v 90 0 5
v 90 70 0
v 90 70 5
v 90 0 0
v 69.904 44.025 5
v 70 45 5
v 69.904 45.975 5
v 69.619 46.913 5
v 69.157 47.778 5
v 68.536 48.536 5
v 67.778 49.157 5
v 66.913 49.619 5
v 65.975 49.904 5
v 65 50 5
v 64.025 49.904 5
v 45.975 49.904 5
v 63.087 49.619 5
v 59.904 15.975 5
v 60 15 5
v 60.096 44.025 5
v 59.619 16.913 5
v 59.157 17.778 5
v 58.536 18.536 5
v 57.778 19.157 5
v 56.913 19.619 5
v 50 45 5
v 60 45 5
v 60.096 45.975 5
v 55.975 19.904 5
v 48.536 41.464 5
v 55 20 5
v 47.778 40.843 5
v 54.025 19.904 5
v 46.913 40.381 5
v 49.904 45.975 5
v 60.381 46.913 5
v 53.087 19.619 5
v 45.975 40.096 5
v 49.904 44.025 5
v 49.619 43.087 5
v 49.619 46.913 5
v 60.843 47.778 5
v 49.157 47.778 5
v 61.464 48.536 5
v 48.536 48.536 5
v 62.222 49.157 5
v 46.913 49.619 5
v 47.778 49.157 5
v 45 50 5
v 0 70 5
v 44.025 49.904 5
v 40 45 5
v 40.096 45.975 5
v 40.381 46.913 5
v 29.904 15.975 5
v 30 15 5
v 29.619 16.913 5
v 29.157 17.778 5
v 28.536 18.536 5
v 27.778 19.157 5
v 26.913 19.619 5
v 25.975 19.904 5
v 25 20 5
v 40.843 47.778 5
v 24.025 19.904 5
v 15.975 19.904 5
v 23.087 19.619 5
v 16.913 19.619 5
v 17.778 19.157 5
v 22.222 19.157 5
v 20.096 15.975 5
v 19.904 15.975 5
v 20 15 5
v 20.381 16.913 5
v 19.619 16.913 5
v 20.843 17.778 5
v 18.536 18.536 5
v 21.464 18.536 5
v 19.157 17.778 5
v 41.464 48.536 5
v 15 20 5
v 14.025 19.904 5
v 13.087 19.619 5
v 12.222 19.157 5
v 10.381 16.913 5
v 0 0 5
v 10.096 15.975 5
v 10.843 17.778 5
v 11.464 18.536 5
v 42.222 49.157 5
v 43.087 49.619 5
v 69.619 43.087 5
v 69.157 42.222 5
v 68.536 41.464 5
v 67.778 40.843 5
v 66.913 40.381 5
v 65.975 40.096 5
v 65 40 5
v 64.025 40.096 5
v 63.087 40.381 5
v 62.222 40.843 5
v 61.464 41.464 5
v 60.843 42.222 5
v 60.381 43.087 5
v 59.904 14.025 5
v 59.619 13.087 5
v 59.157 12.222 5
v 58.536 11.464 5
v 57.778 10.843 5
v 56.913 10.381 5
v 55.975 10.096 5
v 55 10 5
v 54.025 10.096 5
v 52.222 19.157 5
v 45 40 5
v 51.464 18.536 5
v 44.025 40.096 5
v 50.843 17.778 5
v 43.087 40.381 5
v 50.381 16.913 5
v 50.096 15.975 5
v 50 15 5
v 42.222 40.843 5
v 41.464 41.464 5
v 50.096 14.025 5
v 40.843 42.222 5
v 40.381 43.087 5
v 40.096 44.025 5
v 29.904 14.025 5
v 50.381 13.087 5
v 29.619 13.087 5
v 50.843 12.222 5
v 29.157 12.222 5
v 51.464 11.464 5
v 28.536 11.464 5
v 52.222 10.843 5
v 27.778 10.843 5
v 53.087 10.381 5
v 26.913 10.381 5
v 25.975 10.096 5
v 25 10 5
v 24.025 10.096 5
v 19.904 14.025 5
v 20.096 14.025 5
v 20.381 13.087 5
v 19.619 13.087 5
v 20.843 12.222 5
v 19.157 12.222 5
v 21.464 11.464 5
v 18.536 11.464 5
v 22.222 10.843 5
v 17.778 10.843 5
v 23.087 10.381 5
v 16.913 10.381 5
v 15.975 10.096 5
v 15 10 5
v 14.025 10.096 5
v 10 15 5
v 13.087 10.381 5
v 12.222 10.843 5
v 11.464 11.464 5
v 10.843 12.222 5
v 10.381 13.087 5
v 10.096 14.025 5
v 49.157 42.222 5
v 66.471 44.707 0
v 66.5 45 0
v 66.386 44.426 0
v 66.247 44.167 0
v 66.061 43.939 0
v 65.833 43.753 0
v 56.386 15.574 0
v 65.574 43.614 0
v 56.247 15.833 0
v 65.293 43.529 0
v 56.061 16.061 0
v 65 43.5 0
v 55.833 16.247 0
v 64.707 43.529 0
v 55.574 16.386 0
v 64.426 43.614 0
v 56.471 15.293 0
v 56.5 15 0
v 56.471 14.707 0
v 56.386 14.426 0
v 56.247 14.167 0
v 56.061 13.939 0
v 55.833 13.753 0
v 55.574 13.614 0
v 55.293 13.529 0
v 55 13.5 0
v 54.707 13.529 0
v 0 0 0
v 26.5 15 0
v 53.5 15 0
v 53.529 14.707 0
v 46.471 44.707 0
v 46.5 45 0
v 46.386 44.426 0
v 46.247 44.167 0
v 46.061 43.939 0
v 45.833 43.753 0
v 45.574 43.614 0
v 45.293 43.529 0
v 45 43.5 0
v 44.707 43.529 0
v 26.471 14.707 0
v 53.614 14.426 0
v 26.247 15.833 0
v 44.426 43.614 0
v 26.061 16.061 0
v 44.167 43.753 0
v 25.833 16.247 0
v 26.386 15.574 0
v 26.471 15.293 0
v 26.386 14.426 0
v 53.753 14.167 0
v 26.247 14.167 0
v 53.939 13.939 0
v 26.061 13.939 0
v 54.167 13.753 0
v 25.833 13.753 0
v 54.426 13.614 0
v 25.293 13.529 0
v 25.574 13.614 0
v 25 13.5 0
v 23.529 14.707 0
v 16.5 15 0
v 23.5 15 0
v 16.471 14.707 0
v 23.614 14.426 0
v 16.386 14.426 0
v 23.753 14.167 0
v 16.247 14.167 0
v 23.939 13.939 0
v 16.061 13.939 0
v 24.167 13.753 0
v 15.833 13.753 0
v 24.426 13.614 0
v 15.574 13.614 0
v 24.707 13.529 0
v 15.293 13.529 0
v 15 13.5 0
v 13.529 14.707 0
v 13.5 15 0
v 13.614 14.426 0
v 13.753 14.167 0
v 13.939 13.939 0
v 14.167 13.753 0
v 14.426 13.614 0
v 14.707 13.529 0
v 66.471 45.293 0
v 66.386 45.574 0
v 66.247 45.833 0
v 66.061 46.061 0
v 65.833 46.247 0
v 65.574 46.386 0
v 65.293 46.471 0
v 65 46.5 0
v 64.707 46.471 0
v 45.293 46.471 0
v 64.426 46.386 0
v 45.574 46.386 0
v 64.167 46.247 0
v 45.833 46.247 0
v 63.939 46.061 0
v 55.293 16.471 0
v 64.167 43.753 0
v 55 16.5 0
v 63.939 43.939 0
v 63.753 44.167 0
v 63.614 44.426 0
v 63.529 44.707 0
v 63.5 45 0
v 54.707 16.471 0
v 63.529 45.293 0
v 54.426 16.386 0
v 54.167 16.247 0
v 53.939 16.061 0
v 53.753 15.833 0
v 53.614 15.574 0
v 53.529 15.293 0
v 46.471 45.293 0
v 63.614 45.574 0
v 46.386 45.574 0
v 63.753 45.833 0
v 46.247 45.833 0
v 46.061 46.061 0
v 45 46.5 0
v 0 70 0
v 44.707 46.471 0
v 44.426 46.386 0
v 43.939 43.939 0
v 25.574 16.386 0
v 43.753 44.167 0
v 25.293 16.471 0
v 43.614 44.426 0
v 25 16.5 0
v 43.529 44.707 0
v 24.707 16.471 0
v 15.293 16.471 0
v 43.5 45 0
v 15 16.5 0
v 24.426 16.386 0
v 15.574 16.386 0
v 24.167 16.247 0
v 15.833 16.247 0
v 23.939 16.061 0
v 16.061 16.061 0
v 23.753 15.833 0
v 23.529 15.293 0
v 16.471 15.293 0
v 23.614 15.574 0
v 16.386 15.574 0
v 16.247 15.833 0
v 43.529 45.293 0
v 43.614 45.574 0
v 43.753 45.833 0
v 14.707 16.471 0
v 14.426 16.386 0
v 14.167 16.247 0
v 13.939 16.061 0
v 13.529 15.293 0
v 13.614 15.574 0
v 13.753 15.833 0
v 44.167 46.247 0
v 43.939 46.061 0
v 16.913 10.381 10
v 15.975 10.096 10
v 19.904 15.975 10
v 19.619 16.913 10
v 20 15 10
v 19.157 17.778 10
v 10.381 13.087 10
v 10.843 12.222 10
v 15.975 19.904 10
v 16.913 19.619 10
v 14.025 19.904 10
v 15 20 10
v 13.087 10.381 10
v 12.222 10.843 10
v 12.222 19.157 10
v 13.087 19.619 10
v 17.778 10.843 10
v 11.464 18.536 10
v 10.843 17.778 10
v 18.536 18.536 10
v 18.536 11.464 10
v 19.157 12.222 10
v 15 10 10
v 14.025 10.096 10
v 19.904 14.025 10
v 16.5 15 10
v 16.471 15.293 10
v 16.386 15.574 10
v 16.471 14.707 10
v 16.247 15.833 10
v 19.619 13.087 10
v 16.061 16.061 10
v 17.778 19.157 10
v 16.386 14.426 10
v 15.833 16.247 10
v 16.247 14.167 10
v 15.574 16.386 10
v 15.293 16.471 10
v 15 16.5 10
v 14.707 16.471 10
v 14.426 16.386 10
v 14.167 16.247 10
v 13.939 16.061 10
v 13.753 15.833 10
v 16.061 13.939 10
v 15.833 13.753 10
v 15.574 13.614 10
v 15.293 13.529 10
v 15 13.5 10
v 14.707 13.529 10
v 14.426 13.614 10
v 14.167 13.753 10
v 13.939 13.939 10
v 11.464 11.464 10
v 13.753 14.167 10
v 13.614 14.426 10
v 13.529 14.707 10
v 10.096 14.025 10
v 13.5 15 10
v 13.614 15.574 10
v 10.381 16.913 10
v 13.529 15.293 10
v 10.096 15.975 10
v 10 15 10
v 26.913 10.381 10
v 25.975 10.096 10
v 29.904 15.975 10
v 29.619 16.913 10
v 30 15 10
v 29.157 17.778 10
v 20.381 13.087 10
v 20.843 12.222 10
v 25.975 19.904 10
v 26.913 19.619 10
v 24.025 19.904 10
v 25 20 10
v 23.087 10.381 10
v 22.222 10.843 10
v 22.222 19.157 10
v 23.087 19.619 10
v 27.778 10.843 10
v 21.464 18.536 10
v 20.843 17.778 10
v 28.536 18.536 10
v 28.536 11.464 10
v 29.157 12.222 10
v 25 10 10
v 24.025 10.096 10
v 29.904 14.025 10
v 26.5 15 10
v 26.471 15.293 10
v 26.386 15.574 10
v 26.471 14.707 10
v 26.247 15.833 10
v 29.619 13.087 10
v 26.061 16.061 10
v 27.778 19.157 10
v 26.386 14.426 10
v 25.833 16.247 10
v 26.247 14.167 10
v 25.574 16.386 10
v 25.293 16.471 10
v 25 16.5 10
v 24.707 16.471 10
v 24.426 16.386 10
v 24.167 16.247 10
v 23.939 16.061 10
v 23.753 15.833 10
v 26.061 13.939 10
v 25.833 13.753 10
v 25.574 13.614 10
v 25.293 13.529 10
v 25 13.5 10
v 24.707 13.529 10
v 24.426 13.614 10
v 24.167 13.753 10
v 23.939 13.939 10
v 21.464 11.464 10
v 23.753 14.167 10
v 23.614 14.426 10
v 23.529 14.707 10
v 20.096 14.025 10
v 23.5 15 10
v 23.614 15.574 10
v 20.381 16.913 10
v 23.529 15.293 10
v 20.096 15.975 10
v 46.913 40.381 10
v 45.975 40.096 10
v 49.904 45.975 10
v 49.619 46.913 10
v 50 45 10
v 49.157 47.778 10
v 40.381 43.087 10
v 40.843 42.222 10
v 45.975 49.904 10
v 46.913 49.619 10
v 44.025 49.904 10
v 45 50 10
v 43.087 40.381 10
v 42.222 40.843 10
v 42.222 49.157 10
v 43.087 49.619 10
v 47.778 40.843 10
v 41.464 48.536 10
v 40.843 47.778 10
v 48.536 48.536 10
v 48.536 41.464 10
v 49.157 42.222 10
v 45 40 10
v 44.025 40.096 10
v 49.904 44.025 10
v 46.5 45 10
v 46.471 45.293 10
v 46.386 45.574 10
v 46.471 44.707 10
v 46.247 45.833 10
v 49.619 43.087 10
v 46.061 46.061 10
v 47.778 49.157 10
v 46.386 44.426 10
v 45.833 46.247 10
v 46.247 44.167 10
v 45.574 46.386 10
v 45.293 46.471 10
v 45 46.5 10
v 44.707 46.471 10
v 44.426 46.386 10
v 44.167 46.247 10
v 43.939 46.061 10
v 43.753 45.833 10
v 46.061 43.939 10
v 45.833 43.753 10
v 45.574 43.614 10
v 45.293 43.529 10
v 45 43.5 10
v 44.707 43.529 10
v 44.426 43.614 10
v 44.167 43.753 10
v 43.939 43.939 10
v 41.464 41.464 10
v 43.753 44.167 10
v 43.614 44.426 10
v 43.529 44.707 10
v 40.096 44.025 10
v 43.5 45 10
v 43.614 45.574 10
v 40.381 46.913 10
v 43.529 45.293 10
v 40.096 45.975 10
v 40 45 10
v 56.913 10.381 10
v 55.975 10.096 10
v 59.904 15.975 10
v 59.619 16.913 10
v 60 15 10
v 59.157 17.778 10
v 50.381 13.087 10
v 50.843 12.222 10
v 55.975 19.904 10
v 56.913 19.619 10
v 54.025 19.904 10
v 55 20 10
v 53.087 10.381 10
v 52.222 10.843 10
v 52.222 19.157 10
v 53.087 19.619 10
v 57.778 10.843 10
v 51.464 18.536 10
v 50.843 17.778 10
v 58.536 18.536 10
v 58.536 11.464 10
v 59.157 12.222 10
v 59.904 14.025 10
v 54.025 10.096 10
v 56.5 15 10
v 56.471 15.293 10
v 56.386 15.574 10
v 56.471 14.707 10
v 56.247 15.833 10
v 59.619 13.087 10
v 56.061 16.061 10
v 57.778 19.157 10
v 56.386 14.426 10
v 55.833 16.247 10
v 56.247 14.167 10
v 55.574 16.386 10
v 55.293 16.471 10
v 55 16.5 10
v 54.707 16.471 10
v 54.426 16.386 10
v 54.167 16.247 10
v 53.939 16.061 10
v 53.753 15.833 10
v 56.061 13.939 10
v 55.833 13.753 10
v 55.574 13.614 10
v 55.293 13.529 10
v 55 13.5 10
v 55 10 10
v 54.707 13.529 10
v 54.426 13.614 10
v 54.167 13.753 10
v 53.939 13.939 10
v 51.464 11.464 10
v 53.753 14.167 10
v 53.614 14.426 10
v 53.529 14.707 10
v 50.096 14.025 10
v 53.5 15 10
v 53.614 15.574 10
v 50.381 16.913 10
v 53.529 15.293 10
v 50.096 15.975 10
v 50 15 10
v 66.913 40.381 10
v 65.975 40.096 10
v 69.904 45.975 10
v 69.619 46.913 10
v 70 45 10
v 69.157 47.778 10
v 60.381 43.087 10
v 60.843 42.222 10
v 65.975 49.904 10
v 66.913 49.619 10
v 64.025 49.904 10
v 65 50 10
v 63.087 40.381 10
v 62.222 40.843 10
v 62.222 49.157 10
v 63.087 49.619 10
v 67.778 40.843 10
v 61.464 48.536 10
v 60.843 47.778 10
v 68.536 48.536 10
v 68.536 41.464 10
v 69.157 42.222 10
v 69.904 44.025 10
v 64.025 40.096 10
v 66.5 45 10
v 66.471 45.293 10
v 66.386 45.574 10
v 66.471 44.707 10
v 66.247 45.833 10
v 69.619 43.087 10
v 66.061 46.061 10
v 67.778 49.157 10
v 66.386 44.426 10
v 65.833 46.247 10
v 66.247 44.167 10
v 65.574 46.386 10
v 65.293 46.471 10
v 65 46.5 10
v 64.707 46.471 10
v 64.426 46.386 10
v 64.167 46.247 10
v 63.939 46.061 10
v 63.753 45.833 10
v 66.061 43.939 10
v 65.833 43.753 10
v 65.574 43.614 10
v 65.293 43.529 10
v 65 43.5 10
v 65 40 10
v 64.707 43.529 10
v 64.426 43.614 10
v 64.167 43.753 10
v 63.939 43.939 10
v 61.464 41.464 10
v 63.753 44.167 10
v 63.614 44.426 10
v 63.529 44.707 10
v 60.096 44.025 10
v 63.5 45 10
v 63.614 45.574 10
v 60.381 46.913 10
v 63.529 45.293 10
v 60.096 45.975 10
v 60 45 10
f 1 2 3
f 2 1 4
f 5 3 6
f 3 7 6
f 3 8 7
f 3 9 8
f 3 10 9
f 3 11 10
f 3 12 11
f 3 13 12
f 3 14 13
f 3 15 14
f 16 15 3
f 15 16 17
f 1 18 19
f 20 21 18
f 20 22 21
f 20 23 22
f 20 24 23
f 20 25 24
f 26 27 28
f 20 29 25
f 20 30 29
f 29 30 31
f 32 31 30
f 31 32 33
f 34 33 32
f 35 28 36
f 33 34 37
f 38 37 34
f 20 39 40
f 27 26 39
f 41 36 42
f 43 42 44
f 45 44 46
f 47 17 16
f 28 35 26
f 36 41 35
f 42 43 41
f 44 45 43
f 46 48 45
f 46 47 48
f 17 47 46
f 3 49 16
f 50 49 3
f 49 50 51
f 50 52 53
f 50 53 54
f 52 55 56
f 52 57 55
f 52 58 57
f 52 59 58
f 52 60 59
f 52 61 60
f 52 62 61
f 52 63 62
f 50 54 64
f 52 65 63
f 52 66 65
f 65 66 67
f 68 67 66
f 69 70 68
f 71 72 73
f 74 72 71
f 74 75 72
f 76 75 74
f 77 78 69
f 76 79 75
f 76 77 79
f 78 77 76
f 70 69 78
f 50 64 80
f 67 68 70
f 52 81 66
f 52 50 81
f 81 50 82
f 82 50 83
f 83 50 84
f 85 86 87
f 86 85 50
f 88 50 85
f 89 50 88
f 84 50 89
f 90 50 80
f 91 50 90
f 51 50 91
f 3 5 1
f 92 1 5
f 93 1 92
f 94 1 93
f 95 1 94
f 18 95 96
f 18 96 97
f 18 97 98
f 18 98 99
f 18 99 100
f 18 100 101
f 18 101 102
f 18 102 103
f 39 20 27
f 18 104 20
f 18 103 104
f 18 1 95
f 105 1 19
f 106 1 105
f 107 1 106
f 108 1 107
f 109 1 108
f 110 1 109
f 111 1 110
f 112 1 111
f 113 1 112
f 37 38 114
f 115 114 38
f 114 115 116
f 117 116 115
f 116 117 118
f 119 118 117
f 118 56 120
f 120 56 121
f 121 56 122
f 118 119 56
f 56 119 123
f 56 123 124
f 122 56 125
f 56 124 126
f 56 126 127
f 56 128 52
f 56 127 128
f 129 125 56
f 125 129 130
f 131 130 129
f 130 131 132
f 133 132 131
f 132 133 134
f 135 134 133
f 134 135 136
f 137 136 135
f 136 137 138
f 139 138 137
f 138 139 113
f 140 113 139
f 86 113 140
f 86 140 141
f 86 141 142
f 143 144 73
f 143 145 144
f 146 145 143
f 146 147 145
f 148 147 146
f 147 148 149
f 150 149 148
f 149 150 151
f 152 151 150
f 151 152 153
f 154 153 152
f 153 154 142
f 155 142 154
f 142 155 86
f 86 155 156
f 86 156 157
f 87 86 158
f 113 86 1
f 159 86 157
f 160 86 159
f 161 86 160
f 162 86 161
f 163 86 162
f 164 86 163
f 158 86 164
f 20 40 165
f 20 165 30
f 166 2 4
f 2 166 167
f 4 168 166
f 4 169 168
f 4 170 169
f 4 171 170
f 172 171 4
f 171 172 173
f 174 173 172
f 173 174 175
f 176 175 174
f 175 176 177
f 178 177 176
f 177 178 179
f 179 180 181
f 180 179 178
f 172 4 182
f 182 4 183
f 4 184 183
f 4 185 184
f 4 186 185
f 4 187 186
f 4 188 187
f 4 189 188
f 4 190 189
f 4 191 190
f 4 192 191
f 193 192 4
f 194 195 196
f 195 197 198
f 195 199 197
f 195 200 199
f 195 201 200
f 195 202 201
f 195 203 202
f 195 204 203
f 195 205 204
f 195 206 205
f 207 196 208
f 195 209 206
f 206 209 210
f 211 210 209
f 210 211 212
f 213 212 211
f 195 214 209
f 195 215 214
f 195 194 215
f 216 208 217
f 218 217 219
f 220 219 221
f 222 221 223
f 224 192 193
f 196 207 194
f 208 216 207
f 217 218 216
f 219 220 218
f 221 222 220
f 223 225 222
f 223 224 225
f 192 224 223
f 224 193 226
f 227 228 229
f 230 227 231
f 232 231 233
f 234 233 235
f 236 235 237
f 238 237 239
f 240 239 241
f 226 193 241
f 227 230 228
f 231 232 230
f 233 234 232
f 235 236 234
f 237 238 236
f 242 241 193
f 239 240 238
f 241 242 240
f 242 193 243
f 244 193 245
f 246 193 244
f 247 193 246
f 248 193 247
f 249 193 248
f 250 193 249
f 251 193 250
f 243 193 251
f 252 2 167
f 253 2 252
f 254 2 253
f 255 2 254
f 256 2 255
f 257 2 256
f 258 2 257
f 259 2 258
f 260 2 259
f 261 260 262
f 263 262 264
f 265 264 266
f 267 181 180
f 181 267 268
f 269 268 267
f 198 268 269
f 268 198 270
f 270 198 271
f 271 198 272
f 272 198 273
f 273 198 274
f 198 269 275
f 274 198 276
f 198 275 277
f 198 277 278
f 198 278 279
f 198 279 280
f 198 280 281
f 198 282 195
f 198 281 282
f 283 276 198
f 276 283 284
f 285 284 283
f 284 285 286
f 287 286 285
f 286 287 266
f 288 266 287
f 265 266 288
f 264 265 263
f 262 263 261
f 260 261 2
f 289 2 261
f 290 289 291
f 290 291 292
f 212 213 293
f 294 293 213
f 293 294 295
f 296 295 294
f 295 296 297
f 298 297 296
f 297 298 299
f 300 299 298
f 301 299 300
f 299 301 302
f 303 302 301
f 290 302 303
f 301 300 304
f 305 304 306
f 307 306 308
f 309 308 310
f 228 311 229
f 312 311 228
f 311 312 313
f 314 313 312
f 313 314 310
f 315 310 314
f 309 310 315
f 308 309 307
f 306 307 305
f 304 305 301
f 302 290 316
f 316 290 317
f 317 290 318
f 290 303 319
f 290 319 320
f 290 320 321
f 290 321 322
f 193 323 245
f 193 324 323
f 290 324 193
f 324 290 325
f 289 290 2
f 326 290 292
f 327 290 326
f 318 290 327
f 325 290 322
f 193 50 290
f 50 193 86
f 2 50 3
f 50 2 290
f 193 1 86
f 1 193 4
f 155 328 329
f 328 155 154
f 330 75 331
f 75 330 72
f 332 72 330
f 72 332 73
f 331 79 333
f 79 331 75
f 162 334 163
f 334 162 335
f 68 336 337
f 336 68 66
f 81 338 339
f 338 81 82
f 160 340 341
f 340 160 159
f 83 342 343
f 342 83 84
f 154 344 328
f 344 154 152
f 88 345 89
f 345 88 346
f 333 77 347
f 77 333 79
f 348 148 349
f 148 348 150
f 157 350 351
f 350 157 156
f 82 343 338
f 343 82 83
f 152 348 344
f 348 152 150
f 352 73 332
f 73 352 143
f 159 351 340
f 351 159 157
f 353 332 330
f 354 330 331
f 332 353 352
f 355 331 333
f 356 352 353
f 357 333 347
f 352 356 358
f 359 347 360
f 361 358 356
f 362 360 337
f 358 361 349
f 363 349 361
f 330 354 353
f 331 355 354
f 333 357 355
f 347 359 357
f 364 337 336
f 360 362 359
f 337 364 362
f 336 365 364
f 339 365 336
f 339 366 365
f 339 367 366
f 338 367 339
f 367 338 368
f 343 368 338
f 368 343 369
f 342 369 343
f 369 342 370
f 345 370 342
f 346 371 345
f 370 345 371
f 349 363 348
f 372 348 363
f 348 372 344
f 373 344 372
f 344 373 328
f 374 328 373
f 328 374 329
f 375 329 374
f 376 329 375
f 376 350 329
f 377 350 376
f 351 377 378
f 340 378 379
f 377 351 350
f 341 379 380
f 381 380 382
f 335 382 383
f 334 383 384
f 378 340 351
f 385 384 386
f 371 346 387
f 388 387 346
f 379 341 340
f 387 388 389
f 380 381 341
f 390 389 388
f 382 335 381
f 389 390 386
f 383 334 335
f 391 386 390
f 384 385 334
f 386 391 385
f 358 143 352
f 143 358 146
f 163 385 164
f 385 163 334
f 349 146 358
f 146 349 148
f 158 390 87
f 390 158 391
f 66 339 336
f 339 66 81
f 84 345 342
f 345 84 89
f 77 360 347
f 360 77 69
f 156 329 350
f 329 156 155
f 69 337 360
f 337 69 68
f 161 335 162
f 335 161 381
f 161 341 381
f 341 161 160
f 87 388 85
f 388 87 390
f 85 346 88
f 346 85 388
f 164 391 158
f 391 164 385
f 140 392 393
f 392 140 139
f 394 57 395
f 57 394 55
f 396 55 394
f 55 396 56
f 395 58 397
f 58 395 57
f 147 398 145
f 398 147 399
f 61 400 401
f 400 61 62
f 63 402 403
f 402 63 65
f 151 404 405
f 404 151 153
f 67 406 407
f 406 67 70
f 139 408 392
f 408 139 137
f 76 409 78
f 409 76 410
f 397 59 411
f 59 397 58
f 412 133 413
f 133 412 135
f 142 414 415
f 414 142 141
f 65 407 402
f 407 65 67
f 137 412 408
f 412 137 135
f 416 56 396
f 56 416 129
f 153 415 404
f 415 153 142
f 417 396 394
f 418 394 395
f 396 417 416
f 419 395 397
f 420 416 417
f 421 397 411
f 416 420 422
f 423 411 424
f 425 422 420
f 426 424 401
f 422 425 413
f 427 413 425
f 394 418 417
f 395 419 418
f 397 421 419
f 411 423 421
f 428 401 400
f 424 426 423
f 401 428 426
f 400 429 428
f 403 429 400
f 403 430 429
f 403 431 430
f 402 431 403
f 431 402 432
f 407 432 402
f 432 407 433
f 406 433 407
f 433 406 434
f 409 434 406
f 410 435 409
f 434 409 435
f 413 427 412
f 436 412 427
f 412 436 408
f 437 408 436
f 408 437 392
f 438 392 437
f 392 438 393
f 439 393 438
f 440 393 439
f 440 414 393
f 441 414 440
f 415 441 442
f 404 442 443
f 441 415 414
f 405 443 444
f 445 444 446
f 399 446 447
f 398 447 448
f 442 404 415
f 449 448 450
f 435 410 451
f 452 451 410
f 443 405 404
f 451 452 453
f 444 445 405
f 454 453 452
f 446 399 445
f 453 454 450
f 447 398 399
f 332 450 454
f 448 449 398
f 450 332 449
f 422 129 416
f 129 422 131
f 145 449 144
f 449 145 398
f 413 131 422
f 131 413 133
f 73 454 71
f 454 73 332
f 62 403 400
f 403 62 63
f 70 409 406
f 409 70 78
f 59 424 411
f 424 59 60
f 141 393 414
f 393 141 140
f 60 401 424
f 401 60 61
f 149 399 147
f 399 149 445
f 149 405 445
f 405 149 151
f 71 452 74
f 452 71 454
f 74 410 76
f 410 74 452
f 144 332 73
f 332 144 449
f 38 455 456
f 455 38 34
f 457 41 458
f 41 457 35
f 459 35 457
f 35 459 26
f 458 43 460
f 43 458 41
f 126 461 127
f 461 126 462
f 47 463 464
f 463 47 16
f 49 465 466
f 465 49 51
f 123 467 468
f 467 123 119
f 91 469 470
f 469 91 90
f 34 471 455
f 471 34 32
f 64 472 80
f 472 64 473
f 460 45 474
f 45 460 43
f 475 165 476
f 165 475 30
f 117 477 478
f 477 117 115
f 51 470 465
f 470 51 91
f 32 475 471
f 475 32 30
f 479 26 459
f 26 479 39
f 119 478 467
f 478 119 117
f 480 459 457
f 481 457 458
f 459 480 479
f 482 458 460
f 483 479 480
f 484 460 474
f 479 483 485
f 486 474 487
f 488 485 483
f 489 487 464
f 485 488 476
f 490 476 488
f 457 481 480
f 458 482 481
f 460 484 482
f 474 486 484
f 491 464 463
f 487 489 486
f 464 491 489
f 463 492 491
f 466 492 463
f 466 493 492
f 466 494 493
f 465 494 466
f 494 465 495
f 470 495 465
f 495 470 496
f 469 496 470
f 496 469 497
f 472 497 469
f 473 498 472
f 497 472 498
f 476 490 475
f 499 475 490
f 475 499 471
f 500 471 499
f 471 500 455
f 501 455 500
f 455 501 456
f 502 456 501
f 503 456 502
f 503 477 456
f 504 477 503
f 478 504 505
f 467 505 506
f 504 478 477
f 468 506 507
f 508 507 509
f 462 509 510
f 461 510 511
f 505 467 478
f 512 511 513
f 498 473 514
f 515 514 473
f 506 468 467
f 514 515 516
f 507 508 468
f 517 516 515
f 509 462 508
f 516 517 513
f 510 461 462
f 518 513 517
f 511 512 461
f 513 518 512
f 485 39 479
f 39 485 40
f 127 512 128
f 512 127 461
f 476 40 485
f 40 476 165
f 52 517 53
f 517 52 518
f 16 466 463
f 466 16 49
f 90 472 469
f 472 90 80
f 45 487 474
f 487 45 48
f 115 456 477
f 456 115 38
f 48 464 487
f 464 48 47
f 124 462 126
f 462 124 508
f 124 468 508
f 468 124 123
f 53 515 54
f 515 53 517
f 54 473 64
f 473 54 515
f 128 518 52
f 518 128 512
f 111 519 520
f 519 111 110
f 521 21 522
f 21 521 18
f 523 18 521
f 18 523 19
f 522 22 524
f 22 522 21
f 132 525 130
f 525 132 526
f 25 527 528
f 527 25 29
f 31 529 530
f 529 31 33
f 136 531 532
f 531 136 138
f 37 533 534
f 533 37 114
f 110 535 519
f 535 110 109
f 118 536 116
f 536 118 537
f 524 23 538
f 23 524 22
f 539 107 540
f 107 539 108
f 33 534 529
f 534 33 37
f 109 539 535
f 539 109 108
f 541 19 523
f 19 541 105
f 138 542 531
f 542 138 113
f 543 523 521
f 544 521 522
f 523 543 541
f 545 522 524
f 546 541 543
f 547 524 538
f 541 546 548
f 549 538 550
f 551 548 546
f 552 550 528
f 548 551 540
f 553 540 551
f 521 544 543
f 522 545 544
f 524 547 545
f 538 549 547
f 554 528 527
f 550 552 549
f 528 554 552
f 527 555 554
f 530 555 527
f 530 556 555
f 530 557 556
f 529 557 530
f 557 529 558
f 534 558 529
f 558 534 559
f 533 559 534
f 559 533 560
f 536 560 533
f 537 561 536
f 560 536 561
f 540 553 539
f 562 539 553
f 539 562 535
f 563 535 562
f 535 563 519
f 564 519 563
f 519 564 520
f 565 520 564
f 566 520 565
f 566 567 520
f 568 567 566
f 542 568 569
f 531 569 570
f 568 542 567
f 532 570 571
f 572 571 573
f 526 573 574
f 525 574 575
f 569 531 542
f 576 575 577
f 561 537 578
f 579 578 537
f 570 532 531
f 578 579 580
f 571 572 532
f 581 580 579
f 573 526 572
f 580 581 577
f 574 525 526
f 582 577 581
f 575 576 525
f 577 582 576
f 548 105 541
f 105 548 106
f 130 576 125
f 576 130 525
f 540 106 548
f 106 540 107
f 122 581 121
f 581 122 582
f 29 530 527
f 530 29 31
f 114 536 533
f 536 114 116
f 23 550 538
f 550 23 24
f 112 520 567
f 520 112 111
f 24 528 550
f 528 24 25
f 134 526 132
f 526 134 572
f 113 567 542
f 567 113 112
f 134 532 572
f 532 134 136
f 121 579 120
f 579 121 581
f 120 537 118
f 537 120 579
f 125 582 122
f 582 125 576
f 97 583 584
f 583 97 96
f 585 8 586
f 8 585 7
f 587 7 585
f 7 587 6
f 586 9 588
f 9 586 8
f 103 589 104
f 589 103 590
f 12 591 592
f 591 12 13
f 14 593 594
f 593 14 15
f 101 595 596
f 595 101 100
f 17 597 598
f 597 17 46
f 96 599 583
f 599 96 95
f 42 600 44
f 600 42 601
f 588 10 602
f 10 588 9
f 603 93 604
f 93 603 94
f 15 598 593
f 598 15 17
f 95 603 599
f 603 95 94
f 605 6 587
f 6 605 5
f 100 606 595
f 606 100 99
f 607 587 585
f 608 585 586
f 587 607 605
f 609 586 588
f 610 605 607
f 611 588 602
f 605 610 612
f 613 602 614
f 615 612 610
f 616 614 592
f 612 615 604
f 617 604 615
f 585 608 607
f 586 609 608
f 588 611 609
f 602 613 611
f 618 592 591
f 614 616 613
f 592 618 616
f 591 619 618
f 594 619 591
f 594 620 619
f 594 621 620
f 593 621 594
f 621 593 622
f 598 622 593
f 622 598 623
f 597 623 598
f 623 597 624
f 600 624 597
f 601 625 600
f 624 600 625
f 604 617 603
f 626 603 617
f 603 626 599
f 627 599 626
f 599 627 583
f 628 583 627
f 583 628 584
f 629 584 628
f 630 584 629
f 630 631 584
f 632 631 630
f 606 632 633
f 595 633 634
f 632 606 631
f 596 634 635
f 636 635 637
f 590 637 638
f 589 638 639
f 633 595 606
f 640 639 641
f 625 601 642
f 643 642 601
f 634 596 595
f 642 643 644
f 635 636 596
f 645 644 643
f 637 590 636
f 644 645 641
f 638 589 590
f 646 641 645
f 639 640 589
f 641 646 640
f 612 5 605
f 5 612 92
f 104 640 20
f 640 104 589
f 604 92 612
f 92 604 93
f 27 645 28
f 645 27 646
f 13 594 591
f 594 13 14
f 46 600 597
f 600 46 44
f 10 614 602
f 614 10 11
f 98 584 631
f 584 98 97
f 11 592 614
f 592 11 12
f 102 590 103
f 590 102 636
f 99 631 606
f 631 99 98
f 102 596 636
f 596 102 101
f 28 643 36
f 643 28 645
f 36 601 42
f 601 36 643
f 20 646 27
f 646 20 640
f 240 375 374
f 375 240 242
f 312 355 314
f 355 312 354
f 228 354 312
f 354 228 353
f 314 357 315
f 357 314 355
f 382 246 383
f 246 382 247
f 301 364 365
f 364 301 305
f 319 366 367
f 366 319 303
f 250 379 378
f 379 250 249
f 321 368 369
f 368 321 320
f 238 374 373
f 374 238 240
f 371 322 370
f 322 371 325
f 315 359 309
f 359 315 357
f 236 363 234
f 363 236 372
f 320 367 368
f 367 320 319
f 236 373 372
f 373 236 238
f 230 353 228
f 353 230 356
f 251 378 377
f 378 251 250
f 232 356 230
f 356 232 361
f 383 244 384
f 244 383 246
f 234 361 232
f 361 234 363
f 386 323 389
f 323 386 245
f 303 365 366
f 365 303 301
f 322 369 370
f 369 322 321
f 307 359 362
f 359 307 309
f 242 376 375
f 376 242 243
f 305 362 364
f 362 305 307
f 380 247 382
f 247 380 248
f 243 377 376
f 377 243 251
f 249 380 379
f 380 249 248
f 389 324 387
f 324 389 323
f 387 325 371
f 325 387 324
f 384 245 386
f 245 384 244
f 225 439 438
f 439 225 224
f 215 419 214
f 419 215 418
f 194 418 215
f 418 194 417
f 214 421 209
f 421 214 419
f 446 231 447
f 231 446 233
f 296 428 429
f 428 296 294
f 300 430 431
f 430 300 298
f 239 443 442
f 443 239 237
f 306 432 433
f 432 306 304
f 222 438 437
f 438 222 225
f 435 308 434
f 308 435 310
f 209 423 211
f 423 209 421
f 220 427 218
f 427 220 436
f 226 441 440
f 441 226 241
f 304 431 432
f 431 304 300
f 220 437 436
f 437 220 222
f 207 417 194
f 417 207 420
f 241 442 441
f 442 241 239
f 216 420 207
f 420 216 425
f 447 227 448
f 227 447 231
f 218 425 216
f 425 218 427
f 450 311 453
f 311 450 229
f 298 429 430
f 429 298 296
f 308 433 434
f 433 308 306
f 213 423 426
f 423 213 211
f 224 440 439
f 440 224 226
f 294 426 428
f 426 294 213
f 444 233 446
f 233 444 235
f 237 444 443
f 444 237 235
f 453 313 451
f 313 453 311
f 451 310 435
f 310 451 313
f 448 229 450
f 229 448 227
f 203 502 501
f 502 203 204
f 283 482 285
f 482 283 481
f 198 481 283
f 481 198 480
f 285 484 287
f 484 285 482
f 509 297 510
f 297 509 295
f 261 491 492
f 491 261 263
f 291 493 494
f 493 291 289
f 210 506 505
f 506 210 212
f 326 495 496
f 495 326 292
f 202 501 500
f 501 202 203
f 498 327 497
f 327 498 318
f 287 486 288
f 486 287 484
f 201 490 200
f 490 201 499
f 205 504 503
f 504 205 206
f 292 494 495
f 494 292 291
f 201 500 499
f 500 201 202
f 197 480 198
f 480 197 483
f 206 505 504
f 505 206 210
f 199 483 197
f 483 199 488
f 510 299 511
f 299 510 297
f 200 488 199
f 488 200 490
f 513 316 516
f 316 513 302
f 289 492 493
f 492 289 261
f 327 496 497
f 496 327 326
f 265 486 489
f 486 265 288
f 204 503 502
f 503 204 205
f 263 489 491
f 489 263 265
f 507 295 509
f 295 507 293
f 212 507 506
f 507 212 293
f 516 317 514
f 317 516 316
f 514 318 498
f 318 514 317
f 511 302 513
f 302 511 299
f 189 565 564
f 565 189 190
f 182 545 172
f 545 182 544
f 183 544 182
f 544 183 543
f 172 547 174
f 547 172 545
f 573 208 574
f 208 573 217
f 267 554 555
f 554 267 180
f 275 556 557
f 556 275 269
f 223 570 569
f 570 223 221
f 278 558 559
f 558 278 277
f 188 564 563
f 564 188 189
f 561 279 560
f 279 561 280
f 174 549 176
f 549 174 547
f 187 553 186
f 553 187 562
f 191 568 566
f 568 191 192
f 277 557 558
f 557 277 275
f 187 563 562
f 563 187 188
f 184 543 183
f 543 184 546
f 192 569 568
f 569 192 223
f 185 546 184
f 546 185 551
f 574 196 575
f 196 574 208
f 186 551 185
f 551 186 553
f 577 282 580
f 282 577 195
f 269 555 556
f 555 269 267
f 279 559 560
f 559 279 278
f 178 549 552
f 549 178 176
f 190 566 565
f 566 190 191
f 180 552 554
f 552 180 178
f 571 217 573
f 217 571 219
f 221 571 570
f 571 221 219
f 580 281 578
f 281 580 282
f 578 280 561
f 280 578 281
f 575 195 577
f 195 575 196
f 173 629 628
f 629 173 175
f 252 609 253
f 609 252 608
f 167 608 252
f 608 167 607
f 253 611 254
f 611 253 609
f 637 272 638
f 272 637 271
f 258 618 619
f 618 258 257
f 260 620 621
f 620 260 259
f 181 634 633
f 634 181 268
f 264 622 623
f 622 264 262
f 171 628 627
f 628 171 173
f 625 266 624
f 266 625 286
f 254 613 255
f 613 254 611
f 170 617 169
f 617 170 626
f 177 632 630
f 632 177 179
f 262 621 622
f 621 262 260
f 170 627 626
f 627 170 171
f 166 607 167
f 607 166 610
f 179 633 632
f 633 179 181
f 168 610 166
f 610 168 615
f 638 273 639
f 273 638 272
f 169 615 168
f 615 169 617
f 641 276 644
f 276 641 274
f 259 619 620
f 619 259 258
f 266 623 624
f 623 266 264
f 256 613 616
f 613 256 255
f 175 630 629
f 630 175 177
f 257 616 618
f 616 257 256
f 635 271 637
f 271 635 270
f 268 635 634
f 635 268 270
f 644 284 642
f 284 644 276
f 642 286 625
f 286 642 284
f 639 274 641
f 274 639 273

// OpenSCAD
$fn = 32;

// ----------------------------------------------------------------------
// Boss field: plate with bosses at given coordinates
// ----------------------------------------------------------------------

// --- parameters (mm) ---
plate_l = 90;             // plate length, X
plate_w = 70;             // plate width, Y
plate_t = 5;              // plate thickness, Z
boss_d = 10;              // boss diameter
boss_h = 5;               // boss height above the plate
bore_d = 3;               // boss bore
fit_tol = 0.1;            // tolerance for press fits, mm
free_tol = 0.3;           // tolerance for clearance fits, mm

total_h = plate_t + boss_h;  // overall height

difference() {
  union() {
    cube([plate_l, plate_w, plate_t]);
    translate([15, 15, plate_t]) cylinder(h = boss_h, d = boss_d);
    translate([25, 15, plate_t]) cylinder(h = boss_h, d = boss_d);
    translate([45, 45, plate_t]) cylinder(h = boss_h, d = boss_d);
    translate([55, 15, plate_t]) cylinder(h = boss_h, d = boss_d);
    translate([65, 45, plate_t]) cylinder(h = boss_h, d = boss_d);
  }
  translate([15, 15, -1]) cylinder(h = total_h + 2, d = bore_d);
  translate([25, 15, -1]) cylinder(h = total_h + 2, d = bore_d);
  translate([45, 45, -1]) cylinder(h = total_h + 2, d = bore_d);
  translate([55, 15, -1]) cylinder(h = total_h + 2, d = bore_d);
  translate([65, 45, -1]) cylinder(h = total_h + 2, d = bore_d);
}
